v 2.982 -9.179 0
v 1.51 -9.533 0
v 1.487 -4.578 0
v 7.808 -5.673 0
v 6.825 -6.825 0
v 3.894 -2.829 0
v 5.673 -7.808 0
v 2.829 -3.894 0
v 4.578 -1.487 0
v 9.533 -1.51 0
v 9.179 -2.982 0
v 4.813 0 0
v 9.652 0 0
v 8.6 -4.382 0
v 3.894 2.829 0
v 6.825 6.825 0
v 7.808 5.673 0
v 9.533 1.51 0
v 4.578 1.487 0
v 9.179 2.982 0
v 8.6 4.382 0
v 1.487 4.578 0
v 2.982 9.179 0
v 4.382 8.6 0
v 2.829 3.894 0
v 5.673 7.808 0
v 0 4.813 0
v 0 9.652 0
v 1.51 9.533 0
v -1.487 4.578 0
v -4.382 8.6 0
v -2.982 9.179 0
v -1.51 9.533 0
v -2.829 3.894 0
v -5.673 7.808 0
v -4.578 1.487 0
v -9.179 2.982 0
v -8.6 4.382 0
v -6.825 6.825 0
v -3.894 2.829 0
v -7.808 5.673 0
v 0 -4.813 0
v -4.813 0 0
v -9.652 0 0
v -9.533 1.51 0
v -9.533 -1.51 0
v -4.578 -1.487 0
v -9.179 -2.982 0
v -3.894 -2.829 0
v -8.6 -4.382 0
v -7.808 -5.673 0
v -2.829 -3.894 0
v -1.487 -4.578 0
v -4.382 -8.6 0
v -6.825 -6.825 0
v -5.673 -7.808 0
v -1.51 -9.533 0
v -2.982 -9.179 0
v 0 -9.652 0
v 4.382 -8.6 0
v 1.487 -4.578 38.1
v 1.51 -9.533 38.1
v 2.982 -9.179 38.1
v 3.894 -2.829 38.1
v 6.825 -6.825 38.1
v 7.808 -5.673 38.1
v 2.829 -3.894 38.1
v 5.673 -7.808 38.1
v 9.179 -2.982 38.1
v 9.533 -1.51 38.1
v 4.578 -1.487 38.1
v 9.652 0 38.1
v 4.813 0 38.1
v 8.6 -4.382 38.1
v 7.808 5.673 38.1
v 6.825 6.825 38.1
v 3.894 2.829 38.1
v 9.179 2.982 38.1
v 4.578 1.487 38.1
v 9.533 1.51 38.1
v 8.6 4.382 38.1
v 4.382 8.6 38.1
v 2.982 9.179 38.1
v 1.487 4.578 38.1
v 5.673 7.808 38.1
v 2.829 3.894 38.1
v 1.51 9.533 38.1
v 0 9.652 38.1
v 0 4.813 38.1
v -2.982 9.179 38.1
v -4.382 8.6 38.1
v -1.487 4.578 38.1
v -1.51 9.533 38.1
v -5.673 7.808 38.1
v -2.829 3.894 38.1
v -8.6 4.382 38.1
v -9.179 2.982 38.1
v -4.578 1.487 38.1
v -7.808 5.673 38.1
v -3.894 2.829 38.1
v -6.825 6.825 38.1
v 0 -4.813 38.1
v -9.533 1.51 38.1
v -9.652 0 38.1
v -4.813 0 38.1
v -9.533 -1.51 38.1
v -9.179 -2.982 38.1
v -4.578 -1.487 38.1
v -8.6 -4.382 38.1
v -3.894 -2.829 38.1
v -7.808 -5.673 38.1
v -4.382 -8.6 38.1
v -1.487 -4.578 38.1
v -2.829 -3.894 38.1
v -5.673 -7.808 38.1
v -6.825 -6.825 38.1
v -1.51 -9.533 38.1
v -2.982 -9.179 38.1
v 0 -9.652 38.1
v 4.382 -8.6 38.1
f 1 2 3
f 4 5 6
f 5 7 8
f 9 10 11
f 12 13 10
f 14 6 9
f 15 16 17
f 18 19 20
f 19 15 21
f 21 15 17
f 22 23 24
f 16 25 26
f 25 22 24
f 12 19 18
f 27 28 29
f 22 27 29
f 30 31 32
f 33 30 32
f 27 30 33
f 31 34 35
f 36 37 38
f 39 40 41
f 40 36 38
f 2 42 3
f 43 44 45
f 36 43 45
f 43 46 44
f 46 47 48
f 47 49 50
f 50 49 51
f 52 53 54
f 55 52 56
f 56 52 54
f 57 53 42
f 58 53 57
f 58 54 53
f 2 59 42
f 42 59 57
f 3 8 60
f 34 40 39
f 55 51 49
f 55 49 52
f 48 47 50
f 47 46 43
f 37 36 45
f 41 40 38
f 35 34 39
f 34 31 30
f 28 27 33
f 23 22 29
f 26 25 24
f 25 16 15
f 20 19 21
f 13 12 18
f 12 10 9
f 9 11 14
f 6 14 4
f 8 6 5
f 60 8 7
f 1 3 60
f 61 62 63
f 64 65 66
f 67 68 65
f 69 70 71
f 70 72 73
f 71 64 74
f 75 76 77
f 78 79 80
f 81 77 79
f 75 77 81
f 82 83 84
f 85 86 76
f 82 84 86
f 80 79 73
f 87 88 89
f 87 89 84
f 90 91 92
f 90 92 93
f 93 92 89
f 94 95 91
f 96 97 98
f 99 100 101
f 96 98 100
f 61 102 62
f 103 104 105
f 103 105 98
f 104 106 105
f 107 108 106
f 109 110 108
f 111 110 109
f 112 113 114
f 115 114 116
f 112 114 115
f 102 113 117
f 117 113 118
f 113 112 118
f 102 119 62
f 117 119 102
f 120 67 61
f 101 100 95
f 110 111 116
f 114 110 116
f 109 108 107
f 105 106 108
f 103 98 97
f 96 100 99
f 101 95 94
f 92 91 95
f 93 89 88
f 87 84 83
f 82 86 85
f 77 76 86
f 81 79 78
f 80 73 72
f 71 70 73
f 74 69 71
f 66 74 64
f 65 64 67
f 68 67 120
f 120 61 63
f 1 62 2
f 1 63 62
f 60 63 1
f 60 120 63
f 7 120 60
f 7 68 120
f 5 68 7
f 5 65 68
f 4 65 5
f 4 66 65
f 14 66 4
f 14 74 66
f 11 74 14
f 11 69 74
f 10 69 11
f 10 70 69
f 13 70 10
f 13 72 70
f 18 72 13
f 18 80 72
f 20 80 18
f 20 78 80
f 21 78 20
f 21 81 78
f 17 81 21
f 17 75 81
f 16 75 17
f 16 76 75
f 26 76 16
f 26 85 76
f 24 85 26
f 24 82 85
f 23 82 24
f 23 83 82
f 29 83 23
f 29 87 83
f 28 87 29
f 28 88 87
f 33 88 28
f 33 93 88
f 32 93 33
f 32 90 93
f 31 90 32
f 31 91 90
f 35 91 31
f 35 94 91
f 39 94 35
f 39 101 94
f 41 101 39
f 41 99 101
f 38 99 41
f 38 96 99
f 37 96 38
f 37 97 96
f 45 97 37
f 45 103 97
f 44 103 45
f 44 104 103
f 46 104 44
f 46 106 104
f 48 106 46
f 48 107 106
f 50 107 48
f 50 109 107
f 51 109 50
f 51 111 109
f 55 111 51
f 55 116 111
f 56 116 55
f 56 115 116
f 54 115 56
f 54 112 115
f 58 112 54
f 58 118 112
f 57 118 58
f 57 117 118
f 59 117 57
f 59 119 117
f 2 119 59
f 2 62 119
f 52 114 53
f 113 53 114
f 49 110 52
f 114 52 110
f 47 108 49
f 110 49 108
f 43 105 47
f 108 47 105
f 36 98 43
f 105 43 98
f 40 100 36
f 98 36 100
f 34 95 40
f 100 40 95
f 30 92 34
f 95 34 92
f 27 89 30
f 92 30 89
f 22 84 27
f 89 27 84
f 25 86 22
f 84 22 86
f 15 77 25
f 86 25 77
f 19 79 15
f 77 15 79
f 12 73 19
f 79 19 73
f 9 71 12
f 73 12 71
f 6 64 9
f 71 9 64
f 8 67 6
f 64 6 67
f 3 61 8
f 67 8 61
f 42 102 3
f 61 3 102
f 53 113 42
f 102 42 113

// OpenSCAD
use <../Vitamins/Pipe.scad>;

//Spec_TubingThreeQuarterByFiveEighthInch
//Spec_PipeThreeQuarterInchSch80
//Spec_PipeThreeQuarterInchSch80Stainless
//Spec_PipeOneInchSch80
module PipeInsert2d(pipeSpec=Spec_PipeThreeQuarterInchSch80Stainless(),
                    pipeClearance=PipeClearanceSnug(),
                    length=1) {
  outsideRadius = PipeInnerRadius(pipe=pipeSpec, clearance=pipeClearance, clearanceSign=-1);
  
  difference() {
    circle(r=outsideRadius, $fn=PipeFn(pipeSpec));
    children();
  }
}

scale(25.4)
render()
linear_extrude(height=1.5)
PipeInsert2d(pipeClearance=undef)
circle(r=(3/8/2)+0.002, $fn=20);
